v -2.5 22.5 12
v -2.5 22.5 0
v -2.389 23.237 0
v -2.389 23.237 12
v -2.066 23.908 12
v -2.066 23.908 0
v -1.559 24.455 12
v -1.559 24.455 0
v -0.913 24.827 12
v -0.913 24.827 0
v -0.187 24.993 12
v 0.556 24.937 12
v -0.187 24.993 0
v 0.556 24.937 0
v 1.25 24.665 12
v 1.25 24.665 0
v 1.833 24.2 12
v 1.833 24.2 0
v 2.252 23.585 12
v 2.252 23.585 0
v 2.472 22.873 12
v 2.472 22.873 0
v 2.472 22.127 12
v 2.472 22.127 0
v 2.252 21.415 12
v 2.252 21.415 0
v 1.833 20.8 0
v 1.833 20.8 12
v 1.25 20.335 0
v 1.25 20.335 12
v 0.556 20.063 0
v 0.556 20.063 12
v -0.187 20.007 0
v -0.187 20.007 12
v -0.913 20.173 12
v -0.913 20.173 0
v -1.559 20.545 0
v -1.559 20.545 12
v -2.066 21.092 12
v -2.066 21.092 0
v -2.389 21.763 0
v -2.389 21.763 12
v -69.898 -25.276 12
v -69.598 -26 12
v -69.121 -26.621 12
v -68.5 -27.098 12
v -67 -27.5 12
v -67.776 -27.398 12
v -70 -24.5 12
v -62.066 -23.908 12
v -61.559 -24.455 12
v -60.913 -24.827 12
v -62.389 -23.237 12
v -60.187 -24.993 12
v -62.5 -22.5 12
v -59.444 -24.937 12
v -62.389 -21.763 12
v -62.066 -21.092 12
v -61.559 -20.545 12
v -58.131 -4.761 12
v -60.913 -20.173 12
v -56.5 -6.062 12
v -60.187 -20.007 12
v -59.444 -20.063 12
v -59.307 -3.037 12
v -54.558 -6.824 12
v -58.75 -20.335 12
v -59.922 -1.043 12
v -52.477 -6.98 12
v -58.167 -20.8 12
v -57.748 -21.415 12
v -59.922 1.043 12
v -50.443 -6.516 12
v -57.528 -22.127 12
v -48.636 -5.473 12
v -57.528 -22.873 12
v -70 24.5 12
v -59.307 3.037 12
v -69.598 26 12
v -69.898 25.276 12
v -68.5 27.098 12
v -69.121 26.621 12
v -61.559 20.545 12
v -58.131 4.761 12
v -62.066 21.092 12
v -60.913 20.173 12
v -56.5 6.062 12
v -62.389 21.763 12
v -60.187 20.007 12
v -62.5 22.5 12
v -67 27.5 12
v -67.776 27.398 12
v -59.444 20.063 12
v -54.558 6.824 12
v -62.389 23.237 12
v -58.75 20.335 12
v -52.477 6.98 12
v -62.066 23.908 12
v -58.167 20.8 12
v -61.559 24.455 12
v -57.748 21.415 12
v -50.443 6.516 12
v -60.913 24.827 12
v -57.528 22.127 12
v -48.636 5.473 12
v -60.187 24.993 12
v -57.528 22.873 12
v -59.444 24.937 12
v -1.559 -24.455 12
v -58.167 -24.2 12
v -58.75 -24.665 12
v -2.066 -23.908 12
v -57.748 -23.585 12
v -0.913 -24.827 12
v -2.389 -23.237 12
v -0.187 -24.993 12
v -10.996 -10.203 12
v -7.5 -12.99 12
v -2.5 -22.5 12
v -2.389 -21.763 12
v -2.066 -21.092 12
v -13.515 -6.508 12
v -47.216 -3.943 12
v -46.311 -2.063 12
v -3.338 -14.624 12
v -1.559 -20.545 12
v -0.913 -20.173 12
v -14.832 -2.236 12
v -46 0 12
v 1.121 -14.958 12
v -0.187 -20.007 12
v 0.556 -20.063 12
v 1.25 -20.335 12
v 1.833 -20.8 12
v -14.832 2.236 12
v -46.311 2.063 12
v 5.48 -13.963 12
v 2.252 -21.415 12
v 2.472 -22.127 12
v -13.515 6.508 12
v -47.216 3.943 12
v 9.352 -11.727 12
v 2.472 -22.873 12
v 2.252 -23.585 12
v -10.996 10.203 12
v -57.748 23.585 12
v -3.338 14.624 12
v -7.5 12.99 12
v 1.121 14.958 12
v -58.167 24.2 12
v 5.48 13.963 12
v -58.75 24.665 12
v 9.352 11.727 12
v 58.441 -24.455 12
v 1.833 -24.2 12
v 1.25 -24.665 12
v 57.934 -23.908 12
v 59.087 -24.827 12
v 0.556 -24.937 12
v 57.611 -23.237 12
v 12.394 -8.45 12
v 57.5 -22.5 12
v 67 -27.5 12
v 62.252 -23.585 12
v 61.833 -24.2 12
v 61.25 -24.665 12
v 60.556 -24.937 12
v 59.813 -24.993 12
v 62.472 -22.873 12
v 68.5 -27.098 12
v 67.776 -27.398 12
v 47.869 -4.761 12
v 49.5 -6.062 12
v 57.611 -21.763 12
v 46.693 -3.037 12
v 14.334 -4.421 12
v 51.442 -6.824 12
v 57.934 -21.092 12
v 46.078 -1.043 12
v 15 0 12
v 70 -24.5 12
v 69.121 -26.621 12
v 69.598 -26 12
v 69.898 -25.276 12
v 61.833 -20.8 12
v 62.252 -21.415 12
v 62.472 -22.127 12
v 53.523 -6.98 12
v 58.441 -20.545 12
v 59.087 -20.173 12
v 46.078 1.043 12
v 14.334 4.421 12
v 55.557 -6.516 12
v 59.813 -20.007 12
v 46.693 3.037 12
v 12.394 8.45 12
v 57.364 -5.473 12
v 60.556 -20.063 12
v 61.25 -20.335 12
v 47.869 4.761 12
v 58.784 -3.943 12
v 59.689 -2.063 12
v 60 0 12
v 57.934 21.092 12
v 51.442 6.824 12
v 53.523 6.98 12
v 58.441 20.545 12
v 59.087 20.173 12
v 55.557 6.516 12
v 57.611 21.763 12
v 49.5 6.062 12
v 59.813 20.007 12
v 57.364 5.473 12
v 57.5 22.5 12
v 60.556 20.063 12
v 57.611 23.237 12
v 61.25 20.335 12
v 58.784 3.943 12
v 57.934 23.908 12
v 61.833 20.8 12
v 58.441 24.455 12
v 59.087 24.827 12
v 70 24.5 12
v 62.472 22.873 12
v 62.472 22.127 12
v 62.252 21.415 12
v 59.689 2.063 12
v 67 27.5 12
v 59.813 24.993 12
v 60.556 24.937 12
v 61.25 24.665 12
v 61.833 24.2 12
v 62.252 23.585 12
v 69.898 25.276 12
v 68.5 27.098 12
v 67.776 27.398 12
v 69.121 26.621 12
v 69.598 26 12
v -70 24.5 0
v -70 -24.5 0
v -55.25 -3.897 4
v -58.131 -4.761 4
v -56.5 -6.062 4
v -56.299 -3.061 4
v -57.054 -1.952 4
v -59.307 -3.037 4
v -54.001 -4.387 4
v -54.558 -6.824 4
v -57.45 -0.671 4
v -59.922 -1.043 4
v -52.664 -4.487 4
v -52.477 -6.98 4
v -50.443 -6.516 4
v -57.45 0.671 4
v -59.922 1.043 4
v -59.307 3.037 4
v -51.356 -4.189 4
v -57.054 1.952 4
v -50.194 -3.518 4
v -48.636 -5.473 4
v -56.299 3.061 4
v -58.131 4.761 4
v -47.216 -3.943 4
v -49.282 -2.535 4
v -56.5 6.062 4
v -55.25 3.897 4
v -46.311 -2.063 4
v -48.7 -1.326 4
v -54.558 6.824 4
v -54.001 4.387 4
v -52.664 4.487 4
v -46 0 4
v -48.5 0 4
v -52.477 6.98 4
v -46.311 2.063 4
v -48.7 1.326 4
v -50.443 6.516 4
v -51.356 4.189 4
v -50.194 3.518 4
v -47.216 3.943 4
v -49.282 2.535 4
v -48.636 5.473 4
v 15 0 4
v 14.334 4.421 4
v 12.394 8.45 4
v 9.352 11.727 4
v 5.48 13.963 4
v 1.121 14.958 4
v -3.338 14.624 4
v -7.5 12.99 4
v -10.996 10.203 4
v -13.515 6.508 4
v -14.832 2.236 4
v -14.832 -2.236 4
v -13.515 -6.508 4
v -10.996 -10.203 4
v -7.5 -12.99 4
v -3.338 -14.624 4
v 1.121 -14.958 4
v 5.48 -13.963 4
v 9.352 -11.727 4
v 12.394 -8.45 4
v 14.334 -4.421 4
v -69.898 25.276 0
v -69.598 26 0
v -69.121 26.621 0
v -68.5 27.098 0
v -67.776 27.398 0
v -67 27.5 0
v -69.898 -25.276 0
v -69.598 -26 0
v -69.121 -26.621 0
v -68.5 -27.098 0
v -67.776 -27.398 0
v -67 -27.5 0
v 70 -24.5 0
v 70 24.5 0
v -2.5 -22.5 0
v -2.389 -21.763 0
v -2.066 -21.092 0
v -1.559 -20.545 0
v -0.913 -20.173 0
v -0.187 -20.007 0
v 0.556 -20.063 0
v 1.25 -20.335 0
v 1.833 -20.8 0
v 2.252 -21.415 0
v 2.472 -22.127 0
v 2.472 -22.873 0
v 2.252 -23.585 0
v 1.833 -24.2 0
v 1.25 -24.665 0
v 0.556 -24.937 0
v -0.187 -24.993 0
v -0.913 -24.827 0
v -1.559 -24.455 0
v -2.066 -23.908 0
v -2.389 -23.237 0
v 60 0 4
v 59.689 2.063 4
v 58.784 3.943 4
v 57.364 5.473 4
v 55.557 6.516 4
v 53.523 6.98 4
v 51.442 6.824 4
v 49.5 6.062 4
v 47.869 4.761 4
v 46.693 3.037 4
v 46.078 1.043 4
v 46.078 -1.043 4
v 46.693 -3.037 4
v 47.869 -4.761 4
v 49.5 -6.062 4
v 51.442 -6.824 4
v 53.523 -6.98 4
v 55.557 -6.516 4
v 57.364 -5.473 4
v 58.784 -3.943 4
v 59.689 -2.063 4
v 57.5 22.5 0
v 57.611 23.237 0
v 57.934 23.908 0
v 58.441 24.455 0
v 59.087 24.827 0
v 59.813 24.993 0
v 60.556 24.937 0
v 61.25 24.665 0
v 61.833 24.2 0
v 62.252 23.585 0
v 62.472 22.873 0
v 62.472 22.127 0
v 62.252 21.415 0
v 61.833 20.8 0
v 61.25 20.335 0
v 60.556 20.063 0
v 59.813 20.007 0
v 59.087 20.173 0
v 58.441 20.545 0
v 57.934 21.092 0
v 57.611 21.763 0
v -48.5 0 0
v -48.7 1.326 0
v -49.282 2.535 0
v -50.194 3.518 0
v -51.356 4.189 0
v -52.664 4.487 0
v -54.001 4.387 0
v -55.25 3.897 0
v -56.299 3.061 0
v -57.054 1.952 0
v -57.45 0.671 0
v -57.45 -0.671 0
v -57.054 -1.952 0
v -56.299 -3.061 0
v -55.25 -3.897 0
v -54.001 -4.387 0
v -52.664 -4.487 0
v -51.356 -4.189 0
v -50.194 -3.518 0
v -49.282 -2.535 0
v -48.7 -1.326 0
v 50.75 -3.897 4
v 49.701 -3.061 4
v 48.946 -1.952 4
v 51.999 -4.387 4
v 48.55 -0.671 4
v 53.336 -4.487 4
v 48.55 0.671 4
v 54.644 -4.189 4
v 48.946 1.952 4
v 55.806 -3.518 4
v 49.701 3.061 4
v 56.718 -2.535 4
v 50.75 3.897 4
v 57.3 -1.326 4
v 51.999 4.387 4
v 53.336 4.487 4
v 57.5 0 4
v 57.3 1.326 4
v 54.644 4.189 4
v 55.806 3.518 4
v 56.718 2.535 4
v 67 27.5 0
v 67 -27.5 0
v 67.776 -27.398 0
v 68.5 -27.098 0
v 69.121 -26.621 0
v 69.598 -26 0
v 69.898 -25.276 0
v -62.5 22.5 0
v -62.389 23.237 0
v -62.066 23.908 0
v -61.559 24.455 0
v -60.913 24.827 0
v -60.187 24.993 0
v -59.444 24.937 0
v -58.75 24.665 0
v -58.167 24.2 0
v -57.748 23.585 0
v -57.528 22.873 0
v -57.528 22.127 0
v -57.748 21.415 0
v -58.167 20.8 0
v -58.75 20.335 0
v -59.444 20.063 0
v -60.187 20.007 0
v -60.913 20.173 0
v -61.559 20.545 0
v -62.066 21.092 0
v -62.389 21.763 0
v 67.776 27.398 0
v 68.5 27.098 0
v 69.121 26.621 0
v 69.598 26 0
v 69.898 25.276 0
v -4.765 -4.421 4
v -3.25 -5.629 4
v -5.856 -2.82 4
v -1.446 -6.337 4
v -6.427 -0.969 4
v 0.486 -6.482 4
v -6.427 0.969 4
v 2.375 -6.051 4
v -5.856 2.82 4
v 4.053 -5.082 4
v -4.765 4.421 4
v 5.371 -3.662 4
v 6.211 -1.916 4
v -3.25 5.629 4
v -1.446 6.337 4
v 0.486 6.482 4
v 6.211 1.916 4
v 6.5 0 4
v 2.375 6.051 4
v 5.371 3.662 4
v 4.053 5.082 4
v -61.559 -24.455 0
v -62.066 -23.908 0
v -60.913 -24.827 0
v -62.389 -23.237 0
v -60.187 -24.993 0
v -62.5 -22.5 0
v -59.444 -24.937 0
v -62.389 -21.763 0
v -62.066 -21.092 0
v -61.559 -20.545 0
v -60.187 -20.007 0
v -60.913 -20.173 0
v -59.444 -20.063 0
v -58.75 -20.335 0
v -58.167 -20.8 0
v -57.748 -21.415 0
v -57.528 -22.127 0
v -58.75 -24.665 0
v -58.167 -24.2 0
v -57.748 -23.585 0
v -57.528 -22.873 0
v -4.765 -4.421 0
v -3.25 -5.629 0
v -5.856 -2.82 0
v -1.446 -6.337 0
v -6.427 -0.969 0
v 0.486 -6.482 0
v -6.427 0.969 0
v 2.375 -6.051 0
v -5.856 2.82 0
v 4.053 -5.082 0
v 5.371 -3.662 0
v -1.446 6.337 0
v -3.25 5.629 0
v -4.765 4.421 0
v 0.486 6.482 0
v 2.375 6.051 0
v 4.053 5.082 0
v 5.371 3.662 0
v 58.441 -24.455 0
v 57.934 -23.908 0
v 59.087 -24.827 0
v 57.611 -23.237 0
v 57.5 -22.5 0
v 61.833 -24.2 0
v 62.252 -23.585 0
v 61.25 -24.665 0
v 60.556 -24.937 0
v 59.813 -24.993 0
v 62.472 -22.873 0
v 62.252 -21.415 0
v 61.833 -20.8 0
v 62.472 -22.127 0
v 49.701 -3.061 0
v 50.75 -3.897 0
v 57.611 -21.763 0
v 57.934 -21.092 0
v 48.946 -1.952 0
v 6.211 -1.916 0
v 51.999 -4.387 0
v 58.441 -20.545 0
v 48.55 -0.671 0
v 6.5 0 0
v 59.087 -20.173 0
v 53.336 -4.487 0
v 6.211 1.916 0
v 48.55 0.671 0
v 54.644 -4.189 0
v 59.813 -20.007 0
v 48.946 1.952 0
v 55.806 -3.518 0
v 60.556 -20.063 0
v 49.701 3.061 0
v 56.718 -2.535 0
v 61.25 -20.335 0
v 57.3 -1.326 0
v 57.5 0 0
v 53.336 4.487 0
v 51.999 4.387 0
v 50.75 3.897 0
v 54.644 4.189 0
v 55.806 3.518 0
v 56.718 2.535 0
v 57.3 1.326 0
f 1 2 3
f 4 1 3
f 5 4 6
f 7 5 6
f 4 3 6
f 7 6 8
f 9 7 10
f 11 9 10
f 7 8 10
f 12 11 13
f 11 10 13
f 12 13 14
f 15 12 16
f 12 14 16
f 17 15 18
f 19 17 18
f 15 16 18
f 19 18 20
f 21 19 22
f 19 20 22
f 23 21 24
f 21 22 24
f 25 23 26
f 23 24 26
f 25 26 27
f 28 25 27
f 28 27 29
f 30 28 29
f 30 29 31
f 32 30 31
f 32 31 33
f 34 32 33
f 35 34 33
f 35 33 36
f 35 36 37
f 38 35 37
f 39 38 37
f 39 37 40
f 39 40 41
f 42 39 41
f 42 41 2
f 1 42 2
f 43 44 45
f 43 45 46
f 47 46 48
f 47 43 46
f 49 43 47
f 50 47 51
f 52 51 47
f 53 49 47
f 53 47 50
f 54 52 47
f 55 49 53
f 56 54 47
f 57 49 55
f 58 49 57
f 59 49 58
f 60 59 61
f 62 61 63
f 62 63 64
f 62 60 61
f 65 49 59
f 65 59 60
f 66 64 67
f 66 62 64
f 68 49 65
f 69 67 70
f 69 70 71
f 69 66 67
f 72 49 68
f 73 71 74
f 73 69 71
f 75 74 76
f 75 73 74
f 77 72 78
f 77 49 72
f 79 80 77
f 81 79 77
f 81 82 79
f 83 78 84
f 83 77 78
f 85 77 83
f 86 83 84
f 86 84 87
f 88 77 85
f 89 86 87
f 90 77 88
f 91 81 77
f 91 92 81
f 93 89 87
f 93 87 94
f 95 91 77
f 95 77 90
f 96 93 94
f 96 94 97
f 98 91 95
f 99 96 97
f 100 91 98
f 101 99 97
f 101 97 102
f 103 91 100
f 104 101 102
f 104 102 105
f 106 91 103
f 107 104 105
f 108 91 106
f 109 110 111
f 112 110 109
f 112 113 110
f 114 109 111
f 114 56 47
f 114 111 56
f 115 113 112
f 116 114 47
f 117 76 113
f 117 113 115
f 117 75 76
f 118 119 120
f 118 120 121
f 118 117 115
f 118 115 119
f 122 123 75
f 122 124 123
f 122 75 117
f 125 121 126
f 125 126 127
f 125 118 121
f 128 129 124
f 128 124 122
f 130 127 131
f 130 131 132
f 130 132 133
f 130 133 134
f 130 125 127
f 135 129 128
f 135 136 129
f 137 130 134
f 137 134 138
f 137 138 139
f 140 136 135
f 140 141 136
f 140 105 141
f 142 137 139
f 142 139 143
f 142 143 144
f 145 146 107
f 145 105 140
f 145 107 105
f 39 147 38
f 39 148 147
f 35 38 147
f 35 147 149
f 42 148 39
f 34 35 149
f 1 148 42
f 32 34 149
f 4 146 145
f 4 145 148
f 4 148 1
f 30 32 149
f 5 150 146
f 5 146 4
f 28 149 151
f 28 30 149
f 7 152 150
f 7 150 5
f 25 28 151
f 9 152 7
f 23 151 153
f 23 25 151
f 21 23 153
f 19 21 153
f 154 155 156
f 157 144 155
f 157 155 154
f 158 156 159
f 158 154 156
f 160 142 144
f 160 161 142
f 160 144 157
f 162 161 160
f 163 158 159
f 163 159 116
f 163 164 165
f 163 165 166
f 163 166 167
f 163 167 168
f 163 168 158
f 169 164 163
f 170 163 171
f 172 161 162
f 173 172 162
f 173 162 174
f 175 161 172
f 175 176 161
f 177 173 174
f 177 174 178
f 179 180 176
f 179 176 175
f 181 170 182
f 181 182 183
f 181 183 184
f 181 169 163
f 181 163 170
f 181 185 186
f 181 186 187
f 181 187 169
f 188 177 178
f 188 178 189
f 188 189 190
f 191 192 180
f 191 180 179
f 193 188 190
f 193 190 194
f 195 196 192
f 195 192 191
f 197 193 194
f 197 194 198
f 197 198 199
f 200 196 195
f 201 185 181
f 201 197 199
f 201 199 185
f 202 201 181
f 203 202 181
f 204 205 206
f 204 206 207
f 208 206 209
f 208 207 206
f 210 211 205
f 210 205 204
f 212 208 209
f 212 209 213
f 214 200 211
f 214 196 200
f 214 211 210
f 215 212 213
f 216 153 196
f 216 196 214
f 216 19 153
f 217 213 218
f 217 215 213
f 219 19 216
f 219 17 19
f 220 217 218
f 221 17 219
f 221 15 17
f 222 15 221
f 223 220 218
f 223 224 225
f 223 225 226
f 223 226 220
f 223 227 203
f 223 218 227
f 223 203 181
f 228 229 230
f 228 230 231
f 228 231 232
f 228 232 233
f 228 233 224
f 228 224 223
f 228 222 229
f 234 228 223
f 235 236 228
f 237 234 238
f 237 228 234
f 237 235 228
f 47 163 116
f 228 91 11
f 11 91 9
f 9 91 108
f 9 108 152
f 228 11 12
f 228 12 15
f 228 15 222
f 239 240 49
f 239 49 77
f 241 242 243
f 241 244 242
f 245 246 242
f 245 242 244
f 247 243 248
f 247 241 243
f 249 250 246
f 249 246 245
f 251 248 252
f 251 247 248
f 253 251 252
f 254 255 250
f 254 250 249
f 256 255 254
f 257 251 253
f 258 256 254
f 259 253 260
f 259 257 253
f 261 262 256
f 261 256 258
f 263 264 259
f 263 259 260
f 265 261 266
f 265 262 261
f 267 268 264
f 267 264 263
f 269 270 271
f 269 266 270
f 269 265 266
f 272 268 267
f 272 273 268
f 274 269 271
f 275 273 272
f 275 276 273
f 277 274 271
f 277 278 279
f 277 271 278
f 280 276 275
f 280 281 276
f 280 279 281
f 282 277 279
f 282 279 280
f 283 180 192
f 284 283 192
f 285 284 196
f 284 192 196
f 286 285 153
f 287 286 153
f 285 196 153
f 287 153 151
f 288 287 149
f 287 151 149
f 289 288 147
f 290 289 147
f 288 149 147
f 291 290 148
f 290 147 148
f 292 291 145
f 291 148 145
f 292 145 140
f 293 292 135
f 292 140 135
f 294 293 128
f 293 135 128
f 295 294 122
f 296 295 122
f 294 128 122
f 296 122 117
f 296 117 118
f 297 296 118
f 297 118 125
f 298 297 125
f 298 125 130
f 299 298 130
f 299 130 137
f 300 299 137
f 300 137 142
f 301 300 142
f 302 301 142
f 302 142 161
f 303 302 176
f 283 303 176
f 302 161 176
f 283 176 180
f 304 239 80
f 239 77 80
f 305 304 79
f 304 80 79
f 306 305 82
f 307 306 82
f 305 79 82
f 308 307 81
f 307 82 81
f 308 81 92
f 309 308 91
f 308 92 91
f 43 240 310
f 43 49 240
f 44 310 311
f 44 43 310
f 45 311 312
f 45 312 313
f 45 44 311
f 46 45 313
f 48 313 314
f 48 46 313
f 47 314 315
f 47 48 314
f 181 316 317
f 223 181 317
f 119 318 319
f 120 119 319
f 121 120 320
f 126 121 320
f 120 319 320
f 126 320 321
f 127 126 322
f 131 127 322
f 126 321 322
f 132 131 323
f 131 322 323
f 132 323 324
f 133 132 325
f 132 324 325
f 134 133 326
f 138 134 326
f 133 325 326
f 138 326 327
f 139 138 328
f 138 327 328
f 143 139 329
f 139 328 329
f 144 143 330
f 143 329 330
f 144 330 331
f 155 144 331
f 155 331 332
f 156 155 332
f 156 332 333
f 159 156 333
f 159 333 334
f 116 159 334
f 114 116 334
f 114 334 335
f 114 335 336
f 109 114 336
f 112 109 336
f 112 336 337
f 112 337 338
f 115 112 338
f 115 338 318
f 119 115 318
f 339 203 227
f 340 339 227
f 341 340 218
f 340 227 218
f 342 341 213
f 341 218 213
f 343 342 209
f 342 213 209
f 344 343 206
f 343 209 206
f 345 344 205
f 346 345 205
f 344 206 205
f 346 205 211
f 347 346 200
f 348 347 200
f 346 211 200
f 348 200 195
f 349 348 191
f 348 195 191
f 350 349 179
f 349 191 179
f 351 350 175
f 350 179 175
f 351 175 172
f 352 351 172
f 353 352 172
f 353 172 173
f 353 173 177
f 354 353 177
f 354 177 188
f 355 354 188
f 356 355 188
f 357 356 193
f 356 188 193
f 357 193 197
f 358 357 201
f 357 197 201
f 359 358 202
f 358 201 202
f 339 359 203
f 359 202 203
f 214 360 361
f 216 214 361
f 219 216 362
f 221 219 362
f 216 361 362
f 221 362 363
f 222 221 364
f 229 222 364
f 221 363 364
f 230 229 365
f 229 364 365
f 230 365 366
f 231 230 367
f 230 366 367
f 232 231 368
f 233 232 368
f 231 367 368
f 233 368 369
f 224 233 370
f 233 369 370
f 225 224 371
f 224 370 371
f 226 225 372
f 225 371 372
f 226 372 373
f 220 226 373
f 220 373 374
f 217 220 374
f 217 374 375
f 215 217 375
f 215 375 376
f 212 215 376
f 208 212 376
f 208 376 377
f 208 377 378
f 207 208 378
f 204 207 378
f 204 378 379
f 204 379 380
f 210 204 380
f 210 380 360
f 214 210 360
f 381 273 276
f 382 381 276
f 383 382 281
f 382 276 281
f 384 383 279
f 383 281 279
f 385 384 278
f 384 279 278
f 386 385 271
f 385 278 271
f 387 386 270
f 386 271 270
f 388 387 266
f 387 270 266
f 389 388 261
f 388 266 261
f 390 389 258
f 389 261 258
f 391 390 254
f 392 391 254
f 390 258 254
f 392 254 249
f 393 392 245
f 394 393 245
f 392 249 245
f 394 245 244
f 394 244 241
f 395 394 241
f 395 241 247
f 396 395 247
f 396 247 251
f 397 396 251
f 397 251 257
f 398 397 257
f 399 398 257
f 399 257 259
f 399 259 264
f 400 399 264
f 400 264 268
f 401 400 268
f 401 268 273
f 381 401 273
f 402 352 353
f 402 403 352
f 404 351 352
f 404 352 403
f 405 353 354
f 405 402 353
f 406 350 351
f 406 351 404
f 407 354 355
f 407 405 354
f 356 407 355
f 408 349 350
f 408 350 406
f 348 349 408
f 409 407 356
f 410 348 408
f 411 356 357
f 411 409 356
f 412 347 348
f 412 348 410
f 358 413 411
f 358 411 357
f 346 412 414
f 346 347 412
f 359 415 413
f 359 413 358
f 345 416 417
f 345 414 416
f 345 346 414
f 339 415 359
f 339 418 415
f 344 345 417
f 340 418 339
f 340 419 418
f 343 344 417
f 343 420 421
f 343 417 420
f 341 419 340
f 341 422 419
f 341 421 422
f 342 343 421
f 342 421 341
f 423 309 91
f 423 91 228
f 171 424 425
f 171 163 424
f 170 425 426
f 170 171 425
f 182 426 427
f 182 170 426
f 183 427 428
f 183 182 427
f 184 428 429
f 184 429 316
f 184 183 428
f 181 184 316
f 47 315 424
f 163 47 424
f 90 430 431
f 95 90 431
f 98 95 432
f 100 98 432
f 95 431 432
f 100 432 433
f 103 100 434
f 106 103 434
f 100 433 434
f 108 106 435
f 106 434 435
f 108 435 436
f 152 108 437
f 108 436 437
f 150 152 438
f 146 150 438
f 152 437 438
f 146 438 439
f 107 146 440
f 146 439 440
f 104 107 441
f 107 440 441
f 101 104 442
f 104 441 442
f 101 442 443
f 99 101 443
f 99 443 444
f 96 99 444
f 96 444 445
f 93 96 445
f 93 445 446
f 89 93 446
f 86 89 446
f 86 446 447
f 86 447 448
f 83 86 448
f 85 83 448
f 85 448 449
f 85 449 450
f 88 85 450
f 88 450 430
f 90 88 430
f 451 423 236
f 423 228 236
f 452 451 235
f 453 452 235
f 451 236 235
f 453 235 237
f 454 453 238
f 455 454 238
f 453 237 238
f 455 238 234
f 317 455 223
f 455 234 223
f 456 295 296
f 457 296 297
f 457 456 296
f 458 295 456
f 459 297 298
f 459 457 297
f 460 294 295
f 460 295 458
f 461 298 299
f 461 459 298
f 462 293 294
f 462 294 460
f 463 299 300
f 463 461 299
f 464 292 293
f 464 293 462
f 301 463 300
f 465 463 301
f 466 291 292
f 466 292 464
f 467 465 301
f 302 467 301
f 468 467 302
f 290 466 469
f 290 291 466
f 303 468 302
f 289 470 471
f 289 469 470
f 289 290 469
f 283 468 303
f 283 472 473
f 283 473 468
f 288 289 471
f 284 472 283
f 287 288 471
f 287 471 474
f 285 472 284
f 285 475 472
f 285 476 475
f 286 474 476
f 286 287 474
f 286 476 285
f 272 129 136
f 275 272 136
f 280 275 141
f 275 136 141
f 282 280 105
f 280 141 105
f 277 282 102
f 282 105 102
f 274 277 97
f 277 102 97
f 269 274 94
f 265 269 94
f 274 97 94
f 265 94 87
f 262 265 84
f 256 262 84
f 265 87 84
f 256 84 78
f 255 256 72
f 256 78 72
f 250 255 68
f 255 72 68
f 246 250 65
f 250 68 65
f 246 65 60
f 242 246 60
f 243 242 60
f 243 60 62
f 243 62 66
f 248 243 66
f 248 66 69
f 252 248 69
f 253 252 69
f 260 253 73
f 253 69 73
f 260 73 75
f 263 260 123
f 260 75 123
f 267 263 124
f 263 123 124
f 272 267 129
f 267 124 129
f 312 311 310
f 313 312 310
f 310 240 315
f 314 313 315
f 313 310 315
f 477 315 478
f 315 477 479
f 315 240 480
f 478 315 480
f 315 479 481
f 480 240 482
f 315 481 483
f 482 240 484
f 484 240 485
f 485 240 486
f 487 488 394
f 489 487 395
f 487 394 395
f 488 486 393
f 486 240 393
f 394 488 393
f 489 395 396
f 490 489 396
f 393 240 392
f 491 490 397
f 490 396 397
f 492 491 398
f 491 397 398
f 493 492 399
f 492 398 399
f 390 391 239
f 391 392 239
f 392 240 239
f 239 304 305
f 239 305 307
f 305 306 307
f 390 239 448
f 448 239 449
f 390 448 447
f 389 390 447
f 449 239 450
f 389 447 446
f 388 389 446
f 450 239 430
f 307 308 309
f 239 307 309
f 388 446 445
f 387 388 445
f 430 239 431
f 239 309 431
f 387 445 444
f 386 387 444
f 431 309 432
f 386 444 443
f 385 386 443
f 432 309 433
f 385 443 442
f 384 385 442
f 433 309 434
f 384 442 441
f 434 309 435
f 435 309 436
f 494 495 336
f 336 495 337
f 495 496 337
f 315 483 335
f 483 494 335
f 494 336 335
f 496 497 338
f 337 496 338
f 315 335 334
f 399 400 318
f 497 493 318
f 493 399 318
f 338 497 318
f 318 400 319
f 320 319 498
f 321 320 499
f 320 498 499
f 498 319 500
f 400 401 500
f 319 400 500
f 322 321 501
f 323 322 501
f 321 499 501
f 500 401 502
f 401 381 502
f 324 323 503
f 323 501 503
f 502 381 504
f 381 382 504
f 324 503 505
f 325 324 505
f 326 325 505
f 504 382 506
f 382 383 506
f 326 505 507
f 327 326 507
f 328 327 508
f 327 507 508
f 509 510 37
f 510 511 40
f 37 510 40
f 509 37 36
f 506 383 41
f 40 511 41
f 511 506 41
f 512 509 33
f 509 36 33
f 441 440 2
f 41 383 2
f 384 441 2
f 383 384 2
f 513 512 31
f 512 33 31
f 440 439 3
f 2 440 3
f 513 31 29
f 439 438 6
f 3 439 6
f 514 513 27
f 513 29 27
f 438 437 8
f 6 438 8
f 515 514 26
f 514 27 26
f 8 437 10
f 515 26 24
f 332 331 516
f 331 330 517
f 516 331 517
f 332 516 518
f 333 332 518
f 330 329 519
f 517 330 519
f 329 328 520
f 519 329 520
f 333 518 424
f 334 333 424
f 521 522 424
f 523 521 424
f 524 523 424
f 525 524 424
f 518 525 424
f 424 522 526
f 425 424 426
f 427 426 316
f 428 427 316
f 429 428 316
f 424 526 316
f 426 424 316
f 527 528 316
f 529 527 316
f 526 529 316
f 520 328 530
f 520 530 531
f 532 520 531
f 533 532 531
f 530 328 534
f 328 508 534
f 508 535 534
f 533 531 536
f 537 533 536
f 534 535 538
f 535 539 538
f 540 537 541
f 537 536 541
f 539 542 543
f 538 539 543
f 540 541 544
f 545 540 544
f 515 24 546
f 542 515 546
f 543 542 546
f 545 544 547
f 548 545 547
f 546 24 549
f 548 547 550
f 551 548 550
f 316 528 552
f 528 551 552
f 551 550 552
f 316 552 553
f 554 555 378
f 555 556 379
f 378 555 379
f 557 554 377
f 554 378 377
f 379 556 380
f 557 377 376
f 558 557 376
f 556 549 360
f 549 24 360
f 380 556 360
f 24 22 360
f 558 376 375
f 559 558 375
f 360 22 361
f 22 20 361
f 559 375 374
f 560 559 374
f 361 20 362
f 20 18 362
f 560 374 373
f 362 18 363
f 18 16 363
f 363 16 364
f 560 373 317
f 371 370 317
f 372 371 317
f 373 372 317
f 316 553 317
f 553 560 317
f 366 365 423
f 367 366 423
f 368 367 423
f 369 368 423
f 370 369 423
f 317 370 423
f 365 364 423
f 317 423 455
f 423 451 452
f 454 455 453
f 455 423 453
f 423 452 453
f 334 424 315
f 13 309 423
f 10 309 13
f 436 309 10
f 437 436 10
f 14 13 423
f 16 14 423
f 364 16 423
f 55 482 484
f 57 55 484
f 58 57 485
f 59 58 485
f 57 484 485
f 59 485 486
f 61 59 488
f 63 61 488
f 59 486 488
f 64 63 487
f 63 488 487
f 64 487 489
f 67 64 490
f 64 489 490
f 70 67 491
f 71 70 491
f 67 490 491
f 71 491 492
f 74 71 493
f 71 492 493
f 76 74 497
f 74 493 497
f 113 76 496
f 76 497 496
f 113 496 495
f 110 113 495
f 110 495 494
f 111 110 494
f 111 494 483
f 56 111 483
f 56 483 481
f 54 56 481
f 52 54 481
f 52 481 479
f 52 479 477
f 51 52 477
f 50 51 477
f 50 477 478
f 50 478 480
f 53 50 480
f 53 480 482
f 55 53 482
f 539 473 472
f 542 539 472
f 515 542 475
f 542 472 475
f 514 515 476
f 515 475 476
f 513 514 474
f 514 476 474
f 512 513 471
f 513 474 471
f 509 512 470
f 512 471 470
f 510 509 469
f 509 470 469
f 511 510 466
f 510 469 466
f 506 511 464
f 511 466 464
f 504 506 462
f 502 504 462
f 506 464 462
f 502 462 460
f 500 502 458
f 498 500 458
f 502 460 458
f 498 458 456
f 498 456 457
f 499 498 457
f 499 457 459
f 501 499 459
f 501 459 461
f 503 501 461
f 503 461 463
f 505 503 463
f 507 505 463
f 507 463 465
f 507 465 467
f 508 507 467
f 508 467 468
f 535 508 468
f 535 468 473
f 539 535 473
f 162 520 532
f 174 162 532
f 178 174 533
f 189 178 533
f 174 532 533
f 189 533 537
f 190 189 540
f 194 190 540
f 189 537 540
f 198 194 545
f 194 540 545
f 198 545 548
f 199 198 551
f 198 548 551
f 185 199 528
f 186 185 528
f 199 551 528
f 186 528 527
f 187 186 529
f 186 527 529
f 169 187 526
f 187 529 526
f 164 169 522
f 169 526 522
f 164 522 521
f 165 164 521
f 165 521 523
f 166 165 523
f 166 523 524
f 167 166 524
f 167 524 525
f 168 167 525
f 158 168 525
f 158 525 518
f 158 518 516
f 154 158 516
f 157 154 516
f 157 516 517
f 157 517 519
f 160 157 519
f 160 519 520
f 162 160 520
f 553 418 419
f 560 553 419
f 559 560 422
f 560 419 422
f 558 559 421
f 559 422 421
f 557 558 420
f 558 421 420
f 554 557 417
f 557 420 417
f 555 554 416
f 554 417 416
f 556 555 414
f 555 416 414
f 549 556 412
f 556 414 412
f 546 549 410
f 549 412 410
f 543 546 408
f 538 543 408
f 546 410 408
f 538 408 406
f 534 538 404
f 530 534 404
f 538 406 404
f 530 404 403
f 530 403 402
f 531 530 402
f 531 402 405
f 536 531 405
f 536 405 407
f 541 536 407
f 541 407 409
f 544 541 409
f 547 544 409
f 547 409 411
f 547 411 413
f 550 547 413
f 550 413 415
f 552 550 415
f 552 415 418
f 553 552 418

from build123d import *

# Parameters (mm, degrees)
SKETCH_1_W          = 140
SKETCH_1_H          = 55
EXTRUDE_1_DEPTH     = 12
SKETCH_2_R          = 6.5
SKETCH_2_R_2        = 4.5
CUT_EXTRUDE_1_DEPTH = 77.159372371
FILLET_1_R          = 3
SKETCH_10_R         = 7
CUT_EXTRUDE_2_DEPTH = 8
SKETCH_11_R         = 15
CUT_EXTRUDE_3_DEPTH = 8
HOLE_WIZARD_M6_1_D  = 5


with BuildPart() as part:
    # 草图1 → 凸台-拉伸1 (new body)
    with BuildSketch(Plane.XY):
        Rectangle(SKETCH_1_W, SKETCH_1_H)
    extrude(amount=EXTRUDE_1_DEPTH)

    # 草图2 → 切除-拉伸1 (cut, through all)
    with BuildSketch(Plane.XY.offset(12)):
        Circle(SKETCH_2_R)
        with Locations((-53, 0)):
            Circle(SKETCH_2_R_2)
        with Locations((53, 0)):
            Circle(SKETCH_2_R_2)
    extrude(amount=-CUT_EXTRUDE_1_DEPTH, mode=Mode.SUBTRACT)

    # 圆角1
    fillet_1_edges = [part.edges().sort_by_distance(p)[0] for p in [
        (70, -27.5, 6),
        (-70, -27.5, 6),
        (-70, 27.5, 6),
        (70, 27.5, 6),
    ]]
    fillet(fillet_1_edges, radius=FILLET_1_R)

    # 草图10 → 切除-拉伸2 (cut)
    with BuildSketch(Plane.XY.offset(12)):
        with Locations((-53, 0)):
            Circle(SKETCH_10_R)
        with Locations((53, 0)):
            Circle(SKETCH_10_R)
    extrude(amount=-CUT_EXTRUDE_2_DEPTH, mode=Mode.SUBTRACT)

    # 草图11 → 切除-拉伸3 (cut)
    with BuildSketch(Plane.XY.offset(12)):
        Circle(SKETCH_11_R)
    extrude(amount=-CUT_EXTRUDE_3_DEPTH, mode=Mode.SUBTRACT)

    # M6 螺纹孔1 (through all)
    with Locations(Plane.XY.offset(12)):
        with Locations((-60, 22.5), (-60, -22.5), (0, -22.5), (0, 22.5), (60, 22.5), (60, -22.5)):
            Hole(HOLE_WIZARD_M6_1_D / 2)


solid = part.part
